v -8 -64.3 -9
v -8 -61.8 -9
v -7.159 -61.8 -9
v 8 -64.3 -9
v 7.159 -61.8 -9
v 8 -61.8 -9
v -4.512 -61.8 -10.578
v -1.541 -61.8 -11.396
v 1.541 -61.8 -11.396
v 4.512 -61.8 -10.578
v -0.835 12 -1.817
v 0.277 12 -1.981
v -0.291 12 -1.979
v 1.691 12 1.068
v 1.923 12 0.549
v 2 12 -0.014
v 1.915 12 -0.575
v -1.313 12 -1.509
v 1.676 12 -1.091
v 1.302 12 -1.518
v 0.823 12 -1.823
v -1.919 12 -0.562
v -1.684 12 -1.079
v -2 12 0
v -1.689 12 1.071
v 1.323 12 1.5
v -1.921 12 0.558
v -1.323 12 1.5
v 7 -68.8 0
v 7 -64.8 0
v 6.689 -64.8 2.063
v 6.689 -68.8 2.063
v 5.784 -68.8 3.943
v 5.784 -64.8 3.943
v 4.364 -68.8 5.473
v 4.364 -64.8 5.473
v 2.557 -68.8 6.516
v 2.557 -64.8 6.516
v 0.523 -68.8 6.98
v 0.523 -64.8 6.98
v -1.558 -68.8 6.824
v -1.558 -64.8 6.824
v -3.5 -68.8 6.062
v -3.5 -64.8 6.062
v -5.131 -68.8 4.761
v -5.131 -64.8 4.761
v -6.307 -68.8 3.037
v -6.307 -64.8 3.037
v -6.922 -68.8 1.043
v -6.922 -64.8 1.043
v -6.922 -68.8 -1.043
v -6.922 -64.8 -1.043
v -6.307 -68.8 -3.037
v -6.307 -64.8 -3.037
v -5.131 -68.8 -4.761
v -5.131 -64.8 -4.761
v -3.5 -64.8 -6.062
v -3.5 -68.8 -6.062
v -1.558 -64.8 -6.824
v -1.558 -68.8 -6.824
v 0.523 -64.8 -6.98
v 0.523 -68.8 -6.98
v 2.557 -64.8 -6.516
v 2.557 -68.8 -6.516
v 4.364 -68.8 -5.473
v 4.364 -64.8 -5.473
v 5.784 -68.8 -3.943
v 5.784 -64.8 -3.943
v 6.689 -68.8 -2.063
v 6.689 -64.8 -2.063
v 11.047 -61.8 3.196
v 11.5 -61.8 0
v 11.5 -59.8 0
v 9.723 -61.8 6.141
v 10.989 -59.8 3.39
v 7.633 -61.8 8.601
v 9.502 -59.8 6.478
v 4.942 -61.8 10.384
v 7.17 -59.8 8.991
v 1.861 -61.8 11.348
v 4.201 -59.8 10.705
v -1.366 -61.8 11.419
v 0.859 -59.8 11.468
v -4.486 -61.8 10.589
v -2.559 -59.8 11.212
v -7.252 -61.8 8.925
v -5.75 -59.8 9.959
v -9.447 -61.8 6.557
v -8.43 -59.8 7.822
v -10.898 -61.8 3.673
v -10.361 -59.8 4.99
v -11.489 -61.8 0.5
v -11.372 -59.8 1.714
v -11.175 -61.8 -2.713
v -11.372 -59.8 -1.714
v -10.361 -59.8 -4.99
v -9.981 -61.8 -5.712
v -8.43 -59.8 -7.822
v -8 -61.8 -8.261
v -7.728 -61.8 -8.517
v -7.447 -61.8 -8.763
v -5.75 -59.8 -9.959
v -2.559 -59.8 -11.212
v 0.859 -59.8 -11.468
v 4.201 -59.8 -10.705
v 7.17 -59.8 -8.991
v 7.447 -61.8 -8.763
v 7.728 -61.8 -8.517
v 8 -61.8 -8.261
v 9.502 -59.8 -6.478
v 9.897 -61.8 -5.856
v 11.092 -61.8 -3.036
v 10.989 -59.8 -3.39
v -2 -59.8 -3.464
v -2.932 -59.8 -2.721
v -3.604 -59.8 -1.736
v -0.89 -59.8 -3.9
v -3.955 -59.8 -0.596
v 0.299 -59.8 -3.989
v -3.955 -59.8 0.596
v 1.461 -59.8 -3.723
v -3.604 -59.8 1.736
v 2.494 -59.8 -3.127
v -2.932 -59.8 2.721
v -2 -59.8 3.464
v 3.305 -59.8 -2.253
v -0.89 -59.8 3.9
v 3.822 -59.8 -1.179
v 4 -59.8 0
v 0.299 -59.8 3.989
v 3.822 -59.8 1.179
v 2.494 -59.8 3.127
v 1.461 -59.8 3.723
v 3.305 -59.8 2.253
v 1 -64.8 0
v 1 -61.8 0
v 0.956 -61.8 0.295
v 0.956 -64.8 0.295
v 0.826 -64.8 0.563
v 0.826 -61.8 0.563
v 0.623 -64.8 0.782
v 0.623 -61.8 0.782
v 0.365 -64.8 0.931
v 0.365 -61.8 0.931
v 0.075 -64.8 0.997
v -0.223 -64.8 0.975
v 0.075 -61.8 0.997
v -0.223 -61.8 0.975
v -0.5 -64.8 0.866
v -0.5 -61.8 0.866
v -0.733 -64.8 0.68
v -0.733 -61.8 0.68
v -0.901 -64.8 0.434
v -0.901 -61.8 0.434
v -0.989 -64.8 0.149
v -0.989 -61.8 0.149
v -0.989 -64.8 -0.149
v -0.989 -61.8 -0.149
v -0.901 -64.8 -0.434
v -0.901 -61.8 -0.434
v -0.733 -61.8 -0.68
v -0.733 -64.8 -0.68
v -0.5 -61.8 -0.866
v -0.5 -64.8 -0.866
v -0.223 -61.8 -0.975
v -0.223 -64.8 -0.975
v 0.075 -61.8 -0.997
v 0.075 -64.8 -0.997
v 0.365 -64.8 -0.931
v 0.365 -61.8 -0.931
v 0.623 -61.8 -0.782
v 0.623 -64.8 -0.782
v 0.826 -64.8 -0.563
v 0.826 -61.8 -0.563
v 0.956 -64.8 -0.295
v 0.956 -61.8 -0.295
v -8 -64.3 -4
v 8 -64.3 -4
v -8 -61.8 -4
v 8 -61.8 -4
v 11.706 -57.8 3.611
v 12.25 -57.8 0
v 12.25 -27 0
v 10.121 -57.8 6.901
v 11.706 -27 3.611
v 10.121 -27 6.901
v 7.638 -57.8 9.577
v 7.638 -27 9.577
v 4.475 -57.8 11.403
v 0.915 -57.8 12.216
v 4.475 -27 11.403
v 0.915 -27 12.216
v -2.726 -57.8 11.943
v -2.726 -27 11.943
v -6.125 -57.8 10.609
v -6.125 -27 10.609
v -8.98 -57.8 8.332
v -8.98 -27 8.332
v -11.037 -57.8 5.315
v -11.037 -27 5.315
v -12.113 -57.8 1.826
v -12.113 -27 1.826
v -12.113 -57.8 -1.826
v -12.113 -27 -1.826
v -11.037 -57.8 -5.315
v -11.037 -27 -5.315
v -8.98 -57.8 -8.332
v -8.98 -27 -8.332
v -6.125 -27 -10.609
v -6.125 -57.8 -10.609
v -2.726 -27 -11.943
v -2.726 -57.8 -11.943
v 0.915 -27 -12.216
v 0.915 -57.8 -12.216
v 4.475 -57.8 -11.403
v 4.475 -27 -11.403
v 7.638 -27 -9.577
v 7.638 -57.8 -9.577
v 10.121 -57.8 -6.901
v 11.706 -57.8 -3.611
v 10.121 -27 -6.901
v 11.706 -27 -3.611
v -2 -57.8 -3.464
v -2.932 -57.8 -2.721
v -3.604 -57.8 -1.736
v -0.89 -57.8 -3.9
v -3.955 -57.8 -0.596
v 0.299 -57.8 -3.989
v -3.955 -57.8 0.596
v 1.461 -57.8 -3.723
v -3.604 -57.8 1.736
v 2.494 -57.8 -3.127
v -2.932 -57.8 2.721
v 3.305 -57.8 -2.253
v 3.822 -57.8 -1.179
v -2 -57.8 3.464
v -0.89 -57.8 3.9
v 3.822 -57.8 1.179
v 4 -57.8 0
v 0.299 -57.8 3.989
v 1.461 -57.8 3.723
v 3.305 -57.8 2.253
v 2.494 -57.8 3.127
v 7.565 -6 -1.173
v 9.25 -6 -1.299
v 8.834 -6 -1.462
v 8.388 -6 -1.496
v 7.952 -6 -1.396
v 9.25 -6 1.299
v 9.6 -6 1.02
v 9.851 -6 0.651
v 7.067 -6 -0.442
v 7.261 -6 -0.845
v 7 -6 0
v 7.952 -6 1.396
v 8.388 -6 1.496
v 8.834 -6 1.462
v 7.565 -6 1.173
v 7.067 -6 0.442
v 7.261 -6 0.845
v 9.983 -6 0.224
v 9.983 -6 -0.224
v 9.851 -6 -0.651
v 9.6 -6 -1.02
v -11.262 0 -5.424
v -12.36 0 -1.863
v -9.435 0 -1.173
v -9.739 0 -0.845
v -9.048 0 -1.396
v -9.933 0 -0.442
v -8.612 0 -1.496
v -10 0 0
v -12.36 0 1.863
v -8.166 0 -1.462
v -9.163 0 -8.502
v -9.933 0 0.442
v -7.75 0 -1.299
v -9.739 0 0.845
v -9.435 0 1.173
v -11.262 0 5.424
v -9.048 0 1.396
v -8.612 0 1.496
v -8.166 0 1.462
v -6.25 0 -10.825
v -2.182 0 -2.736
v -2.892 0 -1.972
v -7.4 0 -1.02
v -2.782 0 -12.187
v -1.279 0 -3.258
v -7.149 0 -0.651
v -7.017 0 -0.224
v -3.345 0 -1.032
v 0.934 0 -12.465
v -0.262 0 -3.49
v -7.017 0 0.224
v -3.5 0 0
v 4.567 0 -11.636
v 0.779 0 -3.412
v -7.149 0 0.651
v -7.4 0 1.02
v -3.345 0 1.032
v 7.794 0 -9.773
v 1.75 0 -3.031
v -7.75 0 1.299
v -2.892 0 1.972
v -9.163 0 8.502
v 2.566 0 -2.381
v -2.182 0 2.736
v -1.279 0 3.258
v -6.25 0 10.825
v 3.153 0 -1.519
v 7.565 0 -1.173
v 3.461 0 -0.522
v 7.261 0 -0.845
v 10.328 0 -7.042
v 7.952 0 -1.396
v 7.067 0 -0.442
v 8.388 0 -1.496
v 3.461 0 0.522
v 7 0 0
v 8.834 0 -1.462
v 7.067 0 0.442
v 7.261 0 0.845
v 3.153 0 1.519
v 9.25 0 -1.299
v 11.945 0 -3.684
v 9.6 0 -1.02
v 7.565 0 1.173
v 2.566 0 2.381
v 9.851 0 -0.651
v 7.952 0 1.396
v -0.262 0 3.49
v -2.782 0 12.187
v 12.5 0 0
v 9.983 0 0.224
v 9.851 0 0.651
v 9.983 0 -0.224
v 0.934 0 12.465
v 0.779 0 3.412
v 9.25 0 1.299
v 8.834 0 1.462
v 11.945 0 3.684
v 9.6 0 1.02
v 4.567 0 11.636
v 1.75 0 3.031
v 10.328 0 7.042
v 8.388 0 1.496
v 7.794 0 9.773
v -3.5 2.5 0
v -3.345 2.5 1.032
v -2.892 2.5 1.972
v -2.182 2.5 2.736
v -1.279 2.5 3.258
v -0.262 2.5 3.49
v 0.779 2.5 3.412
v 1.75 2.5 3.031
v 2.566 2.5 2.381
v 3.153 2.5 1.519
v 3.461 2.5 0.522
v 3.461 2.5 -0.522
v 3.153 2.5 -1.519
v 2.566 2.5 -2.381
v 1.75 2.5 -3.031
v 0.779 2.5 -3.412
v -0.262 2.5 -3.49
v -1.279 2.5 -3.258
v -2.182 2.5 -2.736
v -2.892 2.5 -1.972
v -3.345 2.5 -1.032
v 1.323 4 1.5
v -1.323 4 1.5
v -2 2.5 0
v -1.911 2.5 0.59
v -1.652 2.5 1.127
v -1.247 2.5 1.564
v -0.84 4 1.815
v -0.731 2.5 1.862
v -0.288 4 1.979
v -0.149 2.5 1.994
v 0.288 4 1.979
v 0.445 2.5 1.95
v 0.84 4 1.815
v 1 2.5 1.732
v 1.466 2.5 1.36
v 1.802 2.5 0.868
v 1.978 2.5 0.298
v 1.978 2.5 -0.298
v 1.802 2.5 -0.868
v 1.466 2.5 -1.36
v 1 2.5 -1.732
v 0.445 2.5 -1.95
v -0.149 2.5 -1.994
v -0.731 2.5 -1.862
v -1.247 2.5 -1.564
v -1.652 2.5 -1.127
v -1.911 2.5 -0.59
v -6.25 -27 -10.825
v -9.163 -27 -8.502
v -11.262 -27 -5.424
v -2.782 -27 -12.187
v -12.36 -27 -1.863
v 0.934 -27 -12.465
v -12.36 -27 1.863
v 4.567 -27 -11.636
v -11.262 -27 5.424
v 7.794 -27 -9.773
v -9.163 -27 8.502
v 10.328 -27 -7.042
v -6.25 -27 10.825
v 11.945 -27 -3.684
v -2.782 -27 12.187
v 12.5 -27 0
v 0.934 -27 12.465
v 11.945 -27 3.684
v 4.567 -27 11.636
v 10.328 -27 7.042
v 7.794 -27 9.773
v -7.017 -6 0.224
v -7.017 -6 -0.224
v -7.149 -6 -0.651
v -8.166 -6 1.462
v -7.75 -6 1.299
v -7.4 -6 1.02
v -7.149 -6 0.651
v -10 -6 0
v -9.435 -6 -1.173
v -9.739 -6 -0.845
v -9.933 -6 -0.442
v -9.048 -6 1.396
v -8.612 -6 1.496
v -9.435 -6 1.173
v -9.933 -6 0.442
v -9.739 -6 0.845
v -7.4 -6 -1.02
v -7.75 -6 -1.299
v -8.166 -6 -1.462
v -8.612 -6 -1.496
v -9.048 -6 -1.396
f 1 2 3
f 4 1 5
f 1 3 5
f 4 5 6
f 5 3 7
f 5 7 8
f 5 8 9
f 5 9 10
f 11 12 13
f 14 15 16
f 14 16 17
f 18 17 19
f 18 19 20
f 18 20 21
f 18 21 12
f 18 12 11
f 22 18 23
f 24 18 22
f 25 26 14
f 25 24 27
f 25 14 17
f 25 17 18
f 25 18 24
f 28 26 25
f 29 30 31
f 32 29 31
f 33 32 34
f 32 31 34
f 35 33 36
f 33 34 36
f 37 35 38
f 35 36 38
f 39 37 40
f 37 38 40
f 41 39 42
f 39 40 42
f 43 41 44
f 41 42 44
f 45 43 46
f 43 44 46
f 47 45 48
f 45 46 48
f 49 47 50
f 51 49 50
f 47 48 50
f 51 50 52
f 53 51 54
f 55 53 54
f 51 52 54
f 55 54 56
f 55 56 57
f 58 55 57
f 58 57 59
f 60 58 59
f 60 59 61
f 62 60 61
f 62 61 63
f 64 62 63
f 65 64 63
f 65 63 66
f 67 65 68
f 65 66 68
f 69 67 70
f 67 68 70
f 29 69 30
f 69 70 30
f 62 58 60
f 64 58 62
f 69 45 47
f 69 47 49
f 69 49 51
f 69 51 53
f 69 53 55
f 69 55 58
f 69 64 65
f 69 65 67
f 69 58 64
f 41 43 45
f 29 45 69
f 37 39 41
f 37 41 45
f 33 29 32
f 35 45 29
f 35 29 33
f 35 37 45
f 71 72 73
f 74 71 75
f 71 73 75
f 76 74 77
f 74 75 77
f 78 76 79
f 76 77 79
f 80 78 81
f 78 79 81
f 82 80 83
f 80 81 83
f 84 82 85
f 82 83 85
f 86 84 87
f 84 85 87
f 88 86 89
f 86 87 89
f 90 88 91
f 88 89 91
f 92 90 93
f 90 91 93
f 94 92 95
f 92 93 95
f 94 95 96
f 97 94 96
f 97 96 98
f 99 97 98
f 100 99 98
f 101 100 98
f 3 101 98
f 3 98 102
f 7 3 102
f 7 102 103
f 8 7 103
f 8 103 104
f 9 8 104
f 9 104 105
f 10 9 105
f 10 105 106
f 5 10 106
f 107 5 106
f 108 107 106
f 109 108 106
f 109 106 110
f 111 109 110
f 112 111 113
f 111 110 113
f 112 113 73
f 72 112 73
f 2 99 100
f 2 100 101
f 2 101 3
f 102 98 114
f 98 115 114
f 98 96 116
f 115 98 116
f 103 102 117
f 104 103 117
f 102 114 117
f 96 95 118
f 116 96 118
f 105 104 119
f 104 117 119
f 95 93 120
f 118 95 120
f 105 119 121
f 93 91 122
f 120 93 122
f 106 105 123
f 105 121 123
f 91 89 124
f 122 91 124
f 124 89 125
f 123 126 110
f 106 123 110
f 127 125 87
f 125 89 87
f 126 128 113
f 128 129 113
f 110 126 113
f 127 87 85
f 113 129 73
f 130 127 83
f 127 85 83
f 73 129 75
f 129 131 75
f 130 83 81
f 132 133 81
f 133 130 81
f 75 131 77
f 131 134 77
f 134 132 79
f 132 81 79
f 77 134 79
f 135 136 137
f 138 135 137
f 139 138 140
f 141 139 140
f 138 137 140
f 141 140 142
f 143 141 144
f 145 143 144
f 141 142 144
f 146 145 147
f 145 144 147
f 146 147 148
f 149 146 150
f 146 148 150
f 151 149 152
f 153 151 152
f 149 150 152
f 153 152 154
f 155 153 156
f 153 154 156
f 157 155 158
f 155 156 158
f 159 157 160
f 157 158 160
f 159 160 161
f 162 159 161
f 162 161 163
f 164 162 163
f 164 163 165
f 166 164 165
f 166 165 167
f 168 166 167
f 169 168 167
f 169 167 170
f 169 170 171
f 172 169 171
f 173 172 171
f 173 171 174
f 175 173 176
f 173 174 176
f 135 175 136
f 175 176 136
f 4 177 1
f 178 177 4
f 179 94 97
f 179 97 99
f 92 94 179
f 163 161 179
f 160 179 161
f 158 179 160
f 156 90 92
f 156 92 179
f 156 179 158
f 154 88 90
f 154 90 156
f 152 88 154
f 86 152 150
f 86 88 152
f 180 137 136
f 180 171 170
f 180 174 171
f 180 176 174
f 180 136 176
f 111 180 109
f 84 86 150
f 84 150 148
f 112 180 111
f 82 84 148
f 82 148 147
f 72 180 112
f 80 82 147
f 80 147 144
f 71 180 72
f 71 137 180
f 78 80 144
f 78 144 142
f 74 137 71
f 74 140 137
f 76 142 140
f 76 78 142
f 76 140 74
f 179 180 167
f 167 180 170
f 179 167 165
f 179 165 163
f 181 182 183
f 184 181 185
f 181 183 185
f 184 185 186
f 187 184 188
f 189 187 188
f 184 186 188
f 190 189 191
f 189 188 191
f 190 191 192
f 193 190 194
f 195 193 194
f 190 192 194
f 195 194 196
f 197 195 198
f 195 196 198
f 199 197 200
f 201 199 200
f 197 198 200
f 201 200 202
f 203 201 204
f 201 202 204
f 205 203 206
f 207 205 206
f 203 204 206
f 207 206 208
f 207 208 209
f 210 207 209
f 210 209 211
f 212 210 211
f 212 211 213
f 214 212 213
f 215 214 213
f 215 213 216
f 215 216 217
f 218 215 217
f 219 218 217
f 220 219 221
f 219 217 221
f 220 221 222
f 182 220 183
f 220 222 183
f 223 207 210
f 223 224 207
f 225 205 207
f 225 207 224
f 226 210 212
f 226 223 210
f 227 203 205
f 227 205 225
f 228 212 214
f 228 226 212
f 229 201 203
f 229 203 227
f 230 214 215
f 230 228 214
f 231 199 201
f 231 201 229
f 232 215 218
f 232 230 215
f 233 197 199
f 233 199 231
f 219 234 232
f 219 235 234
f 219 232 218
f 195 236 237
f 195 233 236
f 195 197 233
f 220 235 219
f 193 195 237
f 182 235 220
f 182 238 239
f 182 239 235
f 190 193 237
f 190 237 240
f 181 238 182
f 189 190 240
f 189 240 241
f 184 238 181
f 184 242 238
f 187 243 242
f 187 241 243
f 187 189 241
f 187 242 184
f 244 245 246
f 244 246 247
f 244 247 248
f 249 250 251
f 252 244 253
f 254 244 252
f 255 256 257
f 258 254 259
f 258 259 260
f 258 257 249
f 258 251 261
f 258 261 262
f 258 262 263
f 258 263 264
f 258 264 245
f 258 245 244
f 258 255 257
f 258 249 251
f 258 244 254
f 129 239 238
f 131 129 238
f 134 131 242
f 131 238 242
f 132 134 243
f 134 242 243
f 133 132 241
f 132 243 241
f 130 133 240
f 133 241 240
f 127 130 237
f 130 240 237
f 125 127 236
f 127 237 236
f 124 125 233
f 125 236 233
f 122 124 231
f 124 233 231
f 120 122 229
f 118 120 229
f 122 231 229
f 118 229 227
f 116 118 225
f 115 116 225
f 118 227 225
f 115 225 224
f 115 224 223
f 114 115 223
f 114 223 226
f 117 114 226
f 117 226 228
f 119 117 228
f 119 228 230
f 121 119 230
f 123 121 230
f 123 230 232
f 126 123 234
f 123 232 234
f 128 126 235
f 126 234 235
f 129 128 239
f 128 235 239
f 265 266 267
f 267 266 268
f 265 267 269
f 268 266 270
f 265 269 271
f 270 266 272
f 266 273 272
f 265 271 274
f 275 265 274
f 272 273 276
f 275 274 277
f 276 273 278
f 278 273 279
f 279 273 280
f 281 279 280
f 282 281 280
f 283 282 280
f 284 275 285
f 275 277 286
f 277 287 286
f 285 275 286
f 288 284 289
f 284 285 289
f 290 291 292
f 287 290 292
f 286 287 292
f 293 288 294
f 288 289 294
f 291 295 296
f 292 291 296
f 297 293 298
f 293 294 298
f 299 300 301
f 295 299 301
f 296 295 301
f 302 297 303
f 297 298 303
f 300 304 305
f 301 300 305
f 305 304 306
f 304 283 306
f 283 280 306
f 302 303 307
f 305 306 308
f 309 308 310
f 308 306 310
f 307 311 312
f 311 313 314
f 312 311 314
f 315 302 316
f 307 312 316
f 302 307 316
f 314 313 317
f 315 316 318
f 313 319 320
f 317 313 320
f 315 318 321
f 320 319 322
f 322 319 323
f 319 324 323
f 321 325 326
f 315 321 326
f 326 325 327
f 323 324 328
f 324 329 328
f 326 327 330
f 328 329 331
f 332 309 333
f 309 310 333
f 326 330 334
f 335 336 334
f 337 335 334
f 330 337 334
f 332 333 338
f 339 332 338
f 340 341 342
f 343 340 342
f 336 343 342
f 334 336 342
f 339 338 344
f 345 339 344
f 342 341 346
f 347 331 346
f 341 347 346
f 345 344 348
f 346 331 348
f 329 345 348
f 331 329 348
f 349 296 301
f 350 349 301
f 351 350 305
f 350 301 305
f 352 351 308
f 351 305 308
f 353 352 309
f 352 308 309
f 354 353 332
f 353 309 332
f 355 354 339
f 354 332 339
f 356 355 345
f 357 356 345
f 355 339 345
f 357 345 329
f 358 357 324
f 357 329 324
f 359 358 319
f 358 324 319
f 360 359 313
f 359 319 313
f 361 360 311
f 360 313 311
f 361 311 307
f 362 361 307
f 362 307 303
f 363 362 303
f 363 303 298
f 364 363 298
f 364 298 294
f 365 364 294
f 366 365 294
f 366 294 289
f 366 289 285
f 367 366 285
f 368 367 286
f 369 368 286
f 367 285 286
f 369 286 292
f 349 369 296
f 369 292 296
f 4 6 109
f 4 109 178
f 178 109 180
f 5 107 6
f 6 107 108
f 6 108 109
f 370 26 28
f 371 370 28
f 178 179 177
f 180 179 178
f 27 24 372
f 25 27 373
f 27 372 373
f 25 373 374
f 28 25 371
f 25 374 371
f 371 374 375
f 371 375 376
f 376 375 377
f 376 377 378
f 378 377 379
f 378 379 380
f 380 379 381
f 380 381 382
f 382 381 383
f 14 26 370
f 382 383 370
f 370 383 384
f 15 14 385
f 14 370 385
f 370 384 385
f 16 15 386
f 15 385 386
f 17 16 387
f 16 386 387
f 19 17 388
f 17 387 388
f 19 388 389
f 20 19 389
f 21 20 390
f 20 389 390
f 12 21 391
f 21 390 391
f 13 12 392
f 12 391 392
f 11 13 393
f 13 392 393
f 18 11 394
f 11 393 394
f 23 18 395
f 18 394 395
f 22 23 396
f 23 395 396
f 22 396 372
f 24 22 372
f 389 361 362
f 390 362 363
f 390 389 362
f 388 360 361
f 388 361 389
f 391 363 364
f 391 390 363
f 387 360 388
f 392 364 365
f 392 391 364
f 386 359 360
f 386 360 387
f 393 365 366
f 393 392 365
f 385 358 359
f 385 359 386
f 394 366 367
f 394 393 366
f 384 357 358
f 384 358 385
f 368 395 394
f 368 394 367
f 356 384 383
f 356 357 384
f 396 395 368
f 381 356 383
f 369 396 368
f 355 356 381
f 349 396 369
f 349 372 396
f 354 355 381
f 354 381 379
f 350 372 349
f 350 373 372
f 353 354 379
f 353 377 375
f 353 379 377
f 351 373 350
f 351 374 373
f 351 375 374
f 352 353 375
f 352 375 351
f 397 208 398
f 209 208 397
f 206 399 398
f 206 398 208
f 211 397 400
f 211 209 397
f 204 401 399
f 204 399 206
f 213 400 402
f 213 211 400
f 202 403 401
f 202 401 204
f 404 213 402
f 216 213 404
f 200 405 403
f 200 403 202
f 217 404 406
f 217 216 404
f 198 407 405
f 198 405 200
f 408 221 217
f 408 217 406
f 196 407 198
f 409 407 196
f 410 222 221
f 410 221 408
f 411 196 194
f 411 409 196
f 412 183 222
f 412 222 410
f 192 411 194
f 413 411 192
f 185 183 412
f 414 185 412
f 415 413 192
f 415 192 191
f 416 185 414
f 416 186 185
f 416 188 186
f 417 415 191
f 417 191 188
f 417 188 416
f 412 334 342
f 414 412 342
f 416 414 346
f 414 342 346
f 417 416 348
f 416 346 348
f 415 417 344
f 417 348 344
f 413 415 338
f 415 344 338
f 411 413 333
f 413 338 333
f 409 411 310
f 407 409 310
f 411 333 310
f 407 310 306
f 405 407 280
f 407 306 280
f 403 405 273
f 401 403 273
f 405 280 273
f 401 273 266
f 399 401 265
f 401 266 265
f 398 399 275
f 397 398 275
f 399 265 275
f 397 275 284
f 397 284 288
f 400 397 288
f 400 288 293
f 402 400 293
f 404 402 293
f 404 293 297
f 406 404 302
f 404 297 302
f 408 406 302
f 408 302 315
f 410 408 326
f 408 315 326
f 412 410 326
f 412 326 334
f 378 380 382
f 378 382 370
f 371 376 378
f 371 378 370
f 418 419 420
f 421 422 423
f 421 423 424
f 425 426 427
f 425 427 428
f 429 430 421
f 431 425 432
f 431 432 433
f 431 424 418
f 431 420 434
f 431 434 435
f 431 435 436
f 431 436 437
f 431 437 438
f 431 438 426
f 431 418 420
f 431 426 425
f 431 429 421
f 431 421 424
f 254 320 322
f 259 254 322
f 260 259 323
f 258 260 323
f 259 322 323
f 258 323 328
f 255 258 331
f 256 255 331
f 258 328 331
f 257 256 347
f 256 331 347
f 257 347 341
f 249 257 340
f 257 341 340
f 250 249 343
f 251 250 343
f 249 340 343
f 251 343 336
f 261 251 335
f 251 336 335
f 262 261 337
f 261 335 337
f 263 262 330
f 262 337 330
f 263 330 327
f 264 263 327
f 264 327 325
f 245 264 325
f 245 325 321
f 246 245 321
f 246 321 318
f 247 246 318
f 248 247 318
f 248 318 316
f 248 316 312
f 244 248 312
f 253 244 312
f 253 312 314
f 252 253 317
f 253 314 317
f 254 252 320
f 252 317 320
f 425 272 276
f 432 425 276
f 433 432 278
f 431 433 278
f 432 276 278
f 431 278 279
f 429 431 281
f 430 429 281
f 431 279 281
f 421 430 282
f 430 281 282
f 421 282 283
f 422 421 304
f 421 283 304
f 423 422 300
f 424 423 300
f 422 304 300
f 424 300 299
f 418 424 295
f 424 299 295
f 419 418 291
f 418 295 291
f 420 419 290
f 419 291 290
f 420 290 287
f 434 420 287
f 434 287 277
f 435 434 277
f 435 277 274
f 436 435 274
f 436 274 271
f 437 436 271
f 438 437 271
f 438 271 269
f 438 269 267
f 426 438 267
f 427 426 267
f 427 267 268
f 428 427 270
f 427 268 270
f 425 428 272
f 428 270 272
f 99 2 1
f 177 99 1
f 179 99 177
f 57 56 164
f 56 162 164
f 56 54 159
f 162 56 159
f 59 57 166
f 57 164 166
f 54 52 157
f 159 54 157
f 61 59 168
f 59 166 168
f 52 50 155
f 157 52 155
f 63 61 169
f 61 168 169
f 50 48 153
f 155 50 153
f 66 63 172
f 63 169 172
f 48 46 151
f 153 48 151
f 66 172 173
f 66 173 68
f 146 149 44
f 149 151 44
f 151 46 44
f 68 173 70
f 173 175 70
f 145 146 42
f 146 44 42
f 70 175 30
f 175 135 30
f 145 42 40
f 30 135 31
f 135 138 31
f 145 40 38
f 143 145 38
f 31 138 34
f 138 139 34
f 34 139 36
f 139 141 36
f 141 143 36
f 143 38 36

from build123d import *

# Parameters (mm, degrees)
F0_R      = 12.5
F1_DEPTH  = 27
F2_R      = 12.25
F3_DEPTH  = 30.8
F4_R      = 3.5
F5_DEPTH  = 2.5
F6_R      = 2
F7_DEPTH  = 9.5
F9_DEPTH  = 8
F10_R     = 1.5
F11_DEPTH = 6
F12_R     = 4
F13_DEPTH = 2
F14_R     = 11.5
F15_DEPTH = 2
F16_R     = 1
F17_DEPTH = 3
F18_R     = 7
F19_DEPTH = 4
F20_W     = 16
F20_H     = 5
F21_DEPTH = 2.5


with BuildPart() as f1:
    # F0 (on Front) → F1 (new body)
    with BuildSketch(Plane.XZ):
        Circle(F0_R)
    extrude(amount=F1_DEPTH)

    # F2 (on face) → F3 (join)
    with BuildSketch(Plane.XZ.offset(27)):
        Circle(F2_R)
    extrude(amount=F3_DEPTH)

    # F4 (on face) → F5 (join)
    with BuildSketch(Plane(origin=(0, 0, 0), x_dir=(-1, 0, 0), z_dir=(0, 1, 0))):
        Circle(F4_R)
    extrude(amount=F5_DEPTH)

    # F6 (on face) → F7 (join)
    with BuildSketch(Plane(origin=(0, 2.5, 0), x_dir=(-1, 0, 0), z_dir=(0, 1, 0))):
        Circle(F6_R)
    extrude(amount=F7_DEPTH)

    # F8 (on face) → F9 (cut)
    with BuildSketch(Plane(origin=(0, 12, 0), x_dir=(-1, 0, 0), z_dir=(0, 1, 0))):
        with BuildLine():
            ThreePointArc((1.322876, 1.5), (0, 2), (-1.322876, 1.5))
            Line((-1.322876, 1.5), (1.322876, 1.5))
        make_face()
    extrude(amount=-F9_DEPTH, mode=Mode.SUBTRACT)

    # F10 (on face) → F11 (cut)
    with BuildSketch(Plane(origin=(0, 0, 0), x_dir=(-1, 0, 0), z_dir=(0, 1, 0))):
        with Locations((8.5, 0)):
            Circle(F10_R)
        with Locations((-8.5, 0)):
            Circle(F10_R)
    extrude(amount=-F11_DEPTH, mode=Mode.SUBTRACT)

    # F12 (on face) → F13 (join)
    with BuildSketch(Plane.XZ.offset(57.8)):
        Circle(F12_R)
    extrude(amount=F13_DEPTH)

    # F14 (on face) → F15 (join)
    with BuildSketch(Plane.XZ.offset(59.8)):
        Circle(F14_R)
    extrude(amount=F15_DEPTH)

    # F16 (on face) → F17 (join)
    with BuildSketch(Plane.XZ.offset(61.8)):
        Circle(F16_R)
    extrude(amount=F17_DEPTH)

    # F18 (on face) → F19 (join)
    with BuildSketch(Plane.XZ.offset(64.8)):
        Circle(F18_R)
    extrude(amount=F19_DEPTH)

    # F20 (on face) → F21 (join)
    with BuildSketch(Plane.XZ.offset(61.8)):
        with Locations((0, -6.5)):
            Rectangle(F20_W, F20_H)
    extrude(amount=F21_DEPTH)


solid = f1.part
